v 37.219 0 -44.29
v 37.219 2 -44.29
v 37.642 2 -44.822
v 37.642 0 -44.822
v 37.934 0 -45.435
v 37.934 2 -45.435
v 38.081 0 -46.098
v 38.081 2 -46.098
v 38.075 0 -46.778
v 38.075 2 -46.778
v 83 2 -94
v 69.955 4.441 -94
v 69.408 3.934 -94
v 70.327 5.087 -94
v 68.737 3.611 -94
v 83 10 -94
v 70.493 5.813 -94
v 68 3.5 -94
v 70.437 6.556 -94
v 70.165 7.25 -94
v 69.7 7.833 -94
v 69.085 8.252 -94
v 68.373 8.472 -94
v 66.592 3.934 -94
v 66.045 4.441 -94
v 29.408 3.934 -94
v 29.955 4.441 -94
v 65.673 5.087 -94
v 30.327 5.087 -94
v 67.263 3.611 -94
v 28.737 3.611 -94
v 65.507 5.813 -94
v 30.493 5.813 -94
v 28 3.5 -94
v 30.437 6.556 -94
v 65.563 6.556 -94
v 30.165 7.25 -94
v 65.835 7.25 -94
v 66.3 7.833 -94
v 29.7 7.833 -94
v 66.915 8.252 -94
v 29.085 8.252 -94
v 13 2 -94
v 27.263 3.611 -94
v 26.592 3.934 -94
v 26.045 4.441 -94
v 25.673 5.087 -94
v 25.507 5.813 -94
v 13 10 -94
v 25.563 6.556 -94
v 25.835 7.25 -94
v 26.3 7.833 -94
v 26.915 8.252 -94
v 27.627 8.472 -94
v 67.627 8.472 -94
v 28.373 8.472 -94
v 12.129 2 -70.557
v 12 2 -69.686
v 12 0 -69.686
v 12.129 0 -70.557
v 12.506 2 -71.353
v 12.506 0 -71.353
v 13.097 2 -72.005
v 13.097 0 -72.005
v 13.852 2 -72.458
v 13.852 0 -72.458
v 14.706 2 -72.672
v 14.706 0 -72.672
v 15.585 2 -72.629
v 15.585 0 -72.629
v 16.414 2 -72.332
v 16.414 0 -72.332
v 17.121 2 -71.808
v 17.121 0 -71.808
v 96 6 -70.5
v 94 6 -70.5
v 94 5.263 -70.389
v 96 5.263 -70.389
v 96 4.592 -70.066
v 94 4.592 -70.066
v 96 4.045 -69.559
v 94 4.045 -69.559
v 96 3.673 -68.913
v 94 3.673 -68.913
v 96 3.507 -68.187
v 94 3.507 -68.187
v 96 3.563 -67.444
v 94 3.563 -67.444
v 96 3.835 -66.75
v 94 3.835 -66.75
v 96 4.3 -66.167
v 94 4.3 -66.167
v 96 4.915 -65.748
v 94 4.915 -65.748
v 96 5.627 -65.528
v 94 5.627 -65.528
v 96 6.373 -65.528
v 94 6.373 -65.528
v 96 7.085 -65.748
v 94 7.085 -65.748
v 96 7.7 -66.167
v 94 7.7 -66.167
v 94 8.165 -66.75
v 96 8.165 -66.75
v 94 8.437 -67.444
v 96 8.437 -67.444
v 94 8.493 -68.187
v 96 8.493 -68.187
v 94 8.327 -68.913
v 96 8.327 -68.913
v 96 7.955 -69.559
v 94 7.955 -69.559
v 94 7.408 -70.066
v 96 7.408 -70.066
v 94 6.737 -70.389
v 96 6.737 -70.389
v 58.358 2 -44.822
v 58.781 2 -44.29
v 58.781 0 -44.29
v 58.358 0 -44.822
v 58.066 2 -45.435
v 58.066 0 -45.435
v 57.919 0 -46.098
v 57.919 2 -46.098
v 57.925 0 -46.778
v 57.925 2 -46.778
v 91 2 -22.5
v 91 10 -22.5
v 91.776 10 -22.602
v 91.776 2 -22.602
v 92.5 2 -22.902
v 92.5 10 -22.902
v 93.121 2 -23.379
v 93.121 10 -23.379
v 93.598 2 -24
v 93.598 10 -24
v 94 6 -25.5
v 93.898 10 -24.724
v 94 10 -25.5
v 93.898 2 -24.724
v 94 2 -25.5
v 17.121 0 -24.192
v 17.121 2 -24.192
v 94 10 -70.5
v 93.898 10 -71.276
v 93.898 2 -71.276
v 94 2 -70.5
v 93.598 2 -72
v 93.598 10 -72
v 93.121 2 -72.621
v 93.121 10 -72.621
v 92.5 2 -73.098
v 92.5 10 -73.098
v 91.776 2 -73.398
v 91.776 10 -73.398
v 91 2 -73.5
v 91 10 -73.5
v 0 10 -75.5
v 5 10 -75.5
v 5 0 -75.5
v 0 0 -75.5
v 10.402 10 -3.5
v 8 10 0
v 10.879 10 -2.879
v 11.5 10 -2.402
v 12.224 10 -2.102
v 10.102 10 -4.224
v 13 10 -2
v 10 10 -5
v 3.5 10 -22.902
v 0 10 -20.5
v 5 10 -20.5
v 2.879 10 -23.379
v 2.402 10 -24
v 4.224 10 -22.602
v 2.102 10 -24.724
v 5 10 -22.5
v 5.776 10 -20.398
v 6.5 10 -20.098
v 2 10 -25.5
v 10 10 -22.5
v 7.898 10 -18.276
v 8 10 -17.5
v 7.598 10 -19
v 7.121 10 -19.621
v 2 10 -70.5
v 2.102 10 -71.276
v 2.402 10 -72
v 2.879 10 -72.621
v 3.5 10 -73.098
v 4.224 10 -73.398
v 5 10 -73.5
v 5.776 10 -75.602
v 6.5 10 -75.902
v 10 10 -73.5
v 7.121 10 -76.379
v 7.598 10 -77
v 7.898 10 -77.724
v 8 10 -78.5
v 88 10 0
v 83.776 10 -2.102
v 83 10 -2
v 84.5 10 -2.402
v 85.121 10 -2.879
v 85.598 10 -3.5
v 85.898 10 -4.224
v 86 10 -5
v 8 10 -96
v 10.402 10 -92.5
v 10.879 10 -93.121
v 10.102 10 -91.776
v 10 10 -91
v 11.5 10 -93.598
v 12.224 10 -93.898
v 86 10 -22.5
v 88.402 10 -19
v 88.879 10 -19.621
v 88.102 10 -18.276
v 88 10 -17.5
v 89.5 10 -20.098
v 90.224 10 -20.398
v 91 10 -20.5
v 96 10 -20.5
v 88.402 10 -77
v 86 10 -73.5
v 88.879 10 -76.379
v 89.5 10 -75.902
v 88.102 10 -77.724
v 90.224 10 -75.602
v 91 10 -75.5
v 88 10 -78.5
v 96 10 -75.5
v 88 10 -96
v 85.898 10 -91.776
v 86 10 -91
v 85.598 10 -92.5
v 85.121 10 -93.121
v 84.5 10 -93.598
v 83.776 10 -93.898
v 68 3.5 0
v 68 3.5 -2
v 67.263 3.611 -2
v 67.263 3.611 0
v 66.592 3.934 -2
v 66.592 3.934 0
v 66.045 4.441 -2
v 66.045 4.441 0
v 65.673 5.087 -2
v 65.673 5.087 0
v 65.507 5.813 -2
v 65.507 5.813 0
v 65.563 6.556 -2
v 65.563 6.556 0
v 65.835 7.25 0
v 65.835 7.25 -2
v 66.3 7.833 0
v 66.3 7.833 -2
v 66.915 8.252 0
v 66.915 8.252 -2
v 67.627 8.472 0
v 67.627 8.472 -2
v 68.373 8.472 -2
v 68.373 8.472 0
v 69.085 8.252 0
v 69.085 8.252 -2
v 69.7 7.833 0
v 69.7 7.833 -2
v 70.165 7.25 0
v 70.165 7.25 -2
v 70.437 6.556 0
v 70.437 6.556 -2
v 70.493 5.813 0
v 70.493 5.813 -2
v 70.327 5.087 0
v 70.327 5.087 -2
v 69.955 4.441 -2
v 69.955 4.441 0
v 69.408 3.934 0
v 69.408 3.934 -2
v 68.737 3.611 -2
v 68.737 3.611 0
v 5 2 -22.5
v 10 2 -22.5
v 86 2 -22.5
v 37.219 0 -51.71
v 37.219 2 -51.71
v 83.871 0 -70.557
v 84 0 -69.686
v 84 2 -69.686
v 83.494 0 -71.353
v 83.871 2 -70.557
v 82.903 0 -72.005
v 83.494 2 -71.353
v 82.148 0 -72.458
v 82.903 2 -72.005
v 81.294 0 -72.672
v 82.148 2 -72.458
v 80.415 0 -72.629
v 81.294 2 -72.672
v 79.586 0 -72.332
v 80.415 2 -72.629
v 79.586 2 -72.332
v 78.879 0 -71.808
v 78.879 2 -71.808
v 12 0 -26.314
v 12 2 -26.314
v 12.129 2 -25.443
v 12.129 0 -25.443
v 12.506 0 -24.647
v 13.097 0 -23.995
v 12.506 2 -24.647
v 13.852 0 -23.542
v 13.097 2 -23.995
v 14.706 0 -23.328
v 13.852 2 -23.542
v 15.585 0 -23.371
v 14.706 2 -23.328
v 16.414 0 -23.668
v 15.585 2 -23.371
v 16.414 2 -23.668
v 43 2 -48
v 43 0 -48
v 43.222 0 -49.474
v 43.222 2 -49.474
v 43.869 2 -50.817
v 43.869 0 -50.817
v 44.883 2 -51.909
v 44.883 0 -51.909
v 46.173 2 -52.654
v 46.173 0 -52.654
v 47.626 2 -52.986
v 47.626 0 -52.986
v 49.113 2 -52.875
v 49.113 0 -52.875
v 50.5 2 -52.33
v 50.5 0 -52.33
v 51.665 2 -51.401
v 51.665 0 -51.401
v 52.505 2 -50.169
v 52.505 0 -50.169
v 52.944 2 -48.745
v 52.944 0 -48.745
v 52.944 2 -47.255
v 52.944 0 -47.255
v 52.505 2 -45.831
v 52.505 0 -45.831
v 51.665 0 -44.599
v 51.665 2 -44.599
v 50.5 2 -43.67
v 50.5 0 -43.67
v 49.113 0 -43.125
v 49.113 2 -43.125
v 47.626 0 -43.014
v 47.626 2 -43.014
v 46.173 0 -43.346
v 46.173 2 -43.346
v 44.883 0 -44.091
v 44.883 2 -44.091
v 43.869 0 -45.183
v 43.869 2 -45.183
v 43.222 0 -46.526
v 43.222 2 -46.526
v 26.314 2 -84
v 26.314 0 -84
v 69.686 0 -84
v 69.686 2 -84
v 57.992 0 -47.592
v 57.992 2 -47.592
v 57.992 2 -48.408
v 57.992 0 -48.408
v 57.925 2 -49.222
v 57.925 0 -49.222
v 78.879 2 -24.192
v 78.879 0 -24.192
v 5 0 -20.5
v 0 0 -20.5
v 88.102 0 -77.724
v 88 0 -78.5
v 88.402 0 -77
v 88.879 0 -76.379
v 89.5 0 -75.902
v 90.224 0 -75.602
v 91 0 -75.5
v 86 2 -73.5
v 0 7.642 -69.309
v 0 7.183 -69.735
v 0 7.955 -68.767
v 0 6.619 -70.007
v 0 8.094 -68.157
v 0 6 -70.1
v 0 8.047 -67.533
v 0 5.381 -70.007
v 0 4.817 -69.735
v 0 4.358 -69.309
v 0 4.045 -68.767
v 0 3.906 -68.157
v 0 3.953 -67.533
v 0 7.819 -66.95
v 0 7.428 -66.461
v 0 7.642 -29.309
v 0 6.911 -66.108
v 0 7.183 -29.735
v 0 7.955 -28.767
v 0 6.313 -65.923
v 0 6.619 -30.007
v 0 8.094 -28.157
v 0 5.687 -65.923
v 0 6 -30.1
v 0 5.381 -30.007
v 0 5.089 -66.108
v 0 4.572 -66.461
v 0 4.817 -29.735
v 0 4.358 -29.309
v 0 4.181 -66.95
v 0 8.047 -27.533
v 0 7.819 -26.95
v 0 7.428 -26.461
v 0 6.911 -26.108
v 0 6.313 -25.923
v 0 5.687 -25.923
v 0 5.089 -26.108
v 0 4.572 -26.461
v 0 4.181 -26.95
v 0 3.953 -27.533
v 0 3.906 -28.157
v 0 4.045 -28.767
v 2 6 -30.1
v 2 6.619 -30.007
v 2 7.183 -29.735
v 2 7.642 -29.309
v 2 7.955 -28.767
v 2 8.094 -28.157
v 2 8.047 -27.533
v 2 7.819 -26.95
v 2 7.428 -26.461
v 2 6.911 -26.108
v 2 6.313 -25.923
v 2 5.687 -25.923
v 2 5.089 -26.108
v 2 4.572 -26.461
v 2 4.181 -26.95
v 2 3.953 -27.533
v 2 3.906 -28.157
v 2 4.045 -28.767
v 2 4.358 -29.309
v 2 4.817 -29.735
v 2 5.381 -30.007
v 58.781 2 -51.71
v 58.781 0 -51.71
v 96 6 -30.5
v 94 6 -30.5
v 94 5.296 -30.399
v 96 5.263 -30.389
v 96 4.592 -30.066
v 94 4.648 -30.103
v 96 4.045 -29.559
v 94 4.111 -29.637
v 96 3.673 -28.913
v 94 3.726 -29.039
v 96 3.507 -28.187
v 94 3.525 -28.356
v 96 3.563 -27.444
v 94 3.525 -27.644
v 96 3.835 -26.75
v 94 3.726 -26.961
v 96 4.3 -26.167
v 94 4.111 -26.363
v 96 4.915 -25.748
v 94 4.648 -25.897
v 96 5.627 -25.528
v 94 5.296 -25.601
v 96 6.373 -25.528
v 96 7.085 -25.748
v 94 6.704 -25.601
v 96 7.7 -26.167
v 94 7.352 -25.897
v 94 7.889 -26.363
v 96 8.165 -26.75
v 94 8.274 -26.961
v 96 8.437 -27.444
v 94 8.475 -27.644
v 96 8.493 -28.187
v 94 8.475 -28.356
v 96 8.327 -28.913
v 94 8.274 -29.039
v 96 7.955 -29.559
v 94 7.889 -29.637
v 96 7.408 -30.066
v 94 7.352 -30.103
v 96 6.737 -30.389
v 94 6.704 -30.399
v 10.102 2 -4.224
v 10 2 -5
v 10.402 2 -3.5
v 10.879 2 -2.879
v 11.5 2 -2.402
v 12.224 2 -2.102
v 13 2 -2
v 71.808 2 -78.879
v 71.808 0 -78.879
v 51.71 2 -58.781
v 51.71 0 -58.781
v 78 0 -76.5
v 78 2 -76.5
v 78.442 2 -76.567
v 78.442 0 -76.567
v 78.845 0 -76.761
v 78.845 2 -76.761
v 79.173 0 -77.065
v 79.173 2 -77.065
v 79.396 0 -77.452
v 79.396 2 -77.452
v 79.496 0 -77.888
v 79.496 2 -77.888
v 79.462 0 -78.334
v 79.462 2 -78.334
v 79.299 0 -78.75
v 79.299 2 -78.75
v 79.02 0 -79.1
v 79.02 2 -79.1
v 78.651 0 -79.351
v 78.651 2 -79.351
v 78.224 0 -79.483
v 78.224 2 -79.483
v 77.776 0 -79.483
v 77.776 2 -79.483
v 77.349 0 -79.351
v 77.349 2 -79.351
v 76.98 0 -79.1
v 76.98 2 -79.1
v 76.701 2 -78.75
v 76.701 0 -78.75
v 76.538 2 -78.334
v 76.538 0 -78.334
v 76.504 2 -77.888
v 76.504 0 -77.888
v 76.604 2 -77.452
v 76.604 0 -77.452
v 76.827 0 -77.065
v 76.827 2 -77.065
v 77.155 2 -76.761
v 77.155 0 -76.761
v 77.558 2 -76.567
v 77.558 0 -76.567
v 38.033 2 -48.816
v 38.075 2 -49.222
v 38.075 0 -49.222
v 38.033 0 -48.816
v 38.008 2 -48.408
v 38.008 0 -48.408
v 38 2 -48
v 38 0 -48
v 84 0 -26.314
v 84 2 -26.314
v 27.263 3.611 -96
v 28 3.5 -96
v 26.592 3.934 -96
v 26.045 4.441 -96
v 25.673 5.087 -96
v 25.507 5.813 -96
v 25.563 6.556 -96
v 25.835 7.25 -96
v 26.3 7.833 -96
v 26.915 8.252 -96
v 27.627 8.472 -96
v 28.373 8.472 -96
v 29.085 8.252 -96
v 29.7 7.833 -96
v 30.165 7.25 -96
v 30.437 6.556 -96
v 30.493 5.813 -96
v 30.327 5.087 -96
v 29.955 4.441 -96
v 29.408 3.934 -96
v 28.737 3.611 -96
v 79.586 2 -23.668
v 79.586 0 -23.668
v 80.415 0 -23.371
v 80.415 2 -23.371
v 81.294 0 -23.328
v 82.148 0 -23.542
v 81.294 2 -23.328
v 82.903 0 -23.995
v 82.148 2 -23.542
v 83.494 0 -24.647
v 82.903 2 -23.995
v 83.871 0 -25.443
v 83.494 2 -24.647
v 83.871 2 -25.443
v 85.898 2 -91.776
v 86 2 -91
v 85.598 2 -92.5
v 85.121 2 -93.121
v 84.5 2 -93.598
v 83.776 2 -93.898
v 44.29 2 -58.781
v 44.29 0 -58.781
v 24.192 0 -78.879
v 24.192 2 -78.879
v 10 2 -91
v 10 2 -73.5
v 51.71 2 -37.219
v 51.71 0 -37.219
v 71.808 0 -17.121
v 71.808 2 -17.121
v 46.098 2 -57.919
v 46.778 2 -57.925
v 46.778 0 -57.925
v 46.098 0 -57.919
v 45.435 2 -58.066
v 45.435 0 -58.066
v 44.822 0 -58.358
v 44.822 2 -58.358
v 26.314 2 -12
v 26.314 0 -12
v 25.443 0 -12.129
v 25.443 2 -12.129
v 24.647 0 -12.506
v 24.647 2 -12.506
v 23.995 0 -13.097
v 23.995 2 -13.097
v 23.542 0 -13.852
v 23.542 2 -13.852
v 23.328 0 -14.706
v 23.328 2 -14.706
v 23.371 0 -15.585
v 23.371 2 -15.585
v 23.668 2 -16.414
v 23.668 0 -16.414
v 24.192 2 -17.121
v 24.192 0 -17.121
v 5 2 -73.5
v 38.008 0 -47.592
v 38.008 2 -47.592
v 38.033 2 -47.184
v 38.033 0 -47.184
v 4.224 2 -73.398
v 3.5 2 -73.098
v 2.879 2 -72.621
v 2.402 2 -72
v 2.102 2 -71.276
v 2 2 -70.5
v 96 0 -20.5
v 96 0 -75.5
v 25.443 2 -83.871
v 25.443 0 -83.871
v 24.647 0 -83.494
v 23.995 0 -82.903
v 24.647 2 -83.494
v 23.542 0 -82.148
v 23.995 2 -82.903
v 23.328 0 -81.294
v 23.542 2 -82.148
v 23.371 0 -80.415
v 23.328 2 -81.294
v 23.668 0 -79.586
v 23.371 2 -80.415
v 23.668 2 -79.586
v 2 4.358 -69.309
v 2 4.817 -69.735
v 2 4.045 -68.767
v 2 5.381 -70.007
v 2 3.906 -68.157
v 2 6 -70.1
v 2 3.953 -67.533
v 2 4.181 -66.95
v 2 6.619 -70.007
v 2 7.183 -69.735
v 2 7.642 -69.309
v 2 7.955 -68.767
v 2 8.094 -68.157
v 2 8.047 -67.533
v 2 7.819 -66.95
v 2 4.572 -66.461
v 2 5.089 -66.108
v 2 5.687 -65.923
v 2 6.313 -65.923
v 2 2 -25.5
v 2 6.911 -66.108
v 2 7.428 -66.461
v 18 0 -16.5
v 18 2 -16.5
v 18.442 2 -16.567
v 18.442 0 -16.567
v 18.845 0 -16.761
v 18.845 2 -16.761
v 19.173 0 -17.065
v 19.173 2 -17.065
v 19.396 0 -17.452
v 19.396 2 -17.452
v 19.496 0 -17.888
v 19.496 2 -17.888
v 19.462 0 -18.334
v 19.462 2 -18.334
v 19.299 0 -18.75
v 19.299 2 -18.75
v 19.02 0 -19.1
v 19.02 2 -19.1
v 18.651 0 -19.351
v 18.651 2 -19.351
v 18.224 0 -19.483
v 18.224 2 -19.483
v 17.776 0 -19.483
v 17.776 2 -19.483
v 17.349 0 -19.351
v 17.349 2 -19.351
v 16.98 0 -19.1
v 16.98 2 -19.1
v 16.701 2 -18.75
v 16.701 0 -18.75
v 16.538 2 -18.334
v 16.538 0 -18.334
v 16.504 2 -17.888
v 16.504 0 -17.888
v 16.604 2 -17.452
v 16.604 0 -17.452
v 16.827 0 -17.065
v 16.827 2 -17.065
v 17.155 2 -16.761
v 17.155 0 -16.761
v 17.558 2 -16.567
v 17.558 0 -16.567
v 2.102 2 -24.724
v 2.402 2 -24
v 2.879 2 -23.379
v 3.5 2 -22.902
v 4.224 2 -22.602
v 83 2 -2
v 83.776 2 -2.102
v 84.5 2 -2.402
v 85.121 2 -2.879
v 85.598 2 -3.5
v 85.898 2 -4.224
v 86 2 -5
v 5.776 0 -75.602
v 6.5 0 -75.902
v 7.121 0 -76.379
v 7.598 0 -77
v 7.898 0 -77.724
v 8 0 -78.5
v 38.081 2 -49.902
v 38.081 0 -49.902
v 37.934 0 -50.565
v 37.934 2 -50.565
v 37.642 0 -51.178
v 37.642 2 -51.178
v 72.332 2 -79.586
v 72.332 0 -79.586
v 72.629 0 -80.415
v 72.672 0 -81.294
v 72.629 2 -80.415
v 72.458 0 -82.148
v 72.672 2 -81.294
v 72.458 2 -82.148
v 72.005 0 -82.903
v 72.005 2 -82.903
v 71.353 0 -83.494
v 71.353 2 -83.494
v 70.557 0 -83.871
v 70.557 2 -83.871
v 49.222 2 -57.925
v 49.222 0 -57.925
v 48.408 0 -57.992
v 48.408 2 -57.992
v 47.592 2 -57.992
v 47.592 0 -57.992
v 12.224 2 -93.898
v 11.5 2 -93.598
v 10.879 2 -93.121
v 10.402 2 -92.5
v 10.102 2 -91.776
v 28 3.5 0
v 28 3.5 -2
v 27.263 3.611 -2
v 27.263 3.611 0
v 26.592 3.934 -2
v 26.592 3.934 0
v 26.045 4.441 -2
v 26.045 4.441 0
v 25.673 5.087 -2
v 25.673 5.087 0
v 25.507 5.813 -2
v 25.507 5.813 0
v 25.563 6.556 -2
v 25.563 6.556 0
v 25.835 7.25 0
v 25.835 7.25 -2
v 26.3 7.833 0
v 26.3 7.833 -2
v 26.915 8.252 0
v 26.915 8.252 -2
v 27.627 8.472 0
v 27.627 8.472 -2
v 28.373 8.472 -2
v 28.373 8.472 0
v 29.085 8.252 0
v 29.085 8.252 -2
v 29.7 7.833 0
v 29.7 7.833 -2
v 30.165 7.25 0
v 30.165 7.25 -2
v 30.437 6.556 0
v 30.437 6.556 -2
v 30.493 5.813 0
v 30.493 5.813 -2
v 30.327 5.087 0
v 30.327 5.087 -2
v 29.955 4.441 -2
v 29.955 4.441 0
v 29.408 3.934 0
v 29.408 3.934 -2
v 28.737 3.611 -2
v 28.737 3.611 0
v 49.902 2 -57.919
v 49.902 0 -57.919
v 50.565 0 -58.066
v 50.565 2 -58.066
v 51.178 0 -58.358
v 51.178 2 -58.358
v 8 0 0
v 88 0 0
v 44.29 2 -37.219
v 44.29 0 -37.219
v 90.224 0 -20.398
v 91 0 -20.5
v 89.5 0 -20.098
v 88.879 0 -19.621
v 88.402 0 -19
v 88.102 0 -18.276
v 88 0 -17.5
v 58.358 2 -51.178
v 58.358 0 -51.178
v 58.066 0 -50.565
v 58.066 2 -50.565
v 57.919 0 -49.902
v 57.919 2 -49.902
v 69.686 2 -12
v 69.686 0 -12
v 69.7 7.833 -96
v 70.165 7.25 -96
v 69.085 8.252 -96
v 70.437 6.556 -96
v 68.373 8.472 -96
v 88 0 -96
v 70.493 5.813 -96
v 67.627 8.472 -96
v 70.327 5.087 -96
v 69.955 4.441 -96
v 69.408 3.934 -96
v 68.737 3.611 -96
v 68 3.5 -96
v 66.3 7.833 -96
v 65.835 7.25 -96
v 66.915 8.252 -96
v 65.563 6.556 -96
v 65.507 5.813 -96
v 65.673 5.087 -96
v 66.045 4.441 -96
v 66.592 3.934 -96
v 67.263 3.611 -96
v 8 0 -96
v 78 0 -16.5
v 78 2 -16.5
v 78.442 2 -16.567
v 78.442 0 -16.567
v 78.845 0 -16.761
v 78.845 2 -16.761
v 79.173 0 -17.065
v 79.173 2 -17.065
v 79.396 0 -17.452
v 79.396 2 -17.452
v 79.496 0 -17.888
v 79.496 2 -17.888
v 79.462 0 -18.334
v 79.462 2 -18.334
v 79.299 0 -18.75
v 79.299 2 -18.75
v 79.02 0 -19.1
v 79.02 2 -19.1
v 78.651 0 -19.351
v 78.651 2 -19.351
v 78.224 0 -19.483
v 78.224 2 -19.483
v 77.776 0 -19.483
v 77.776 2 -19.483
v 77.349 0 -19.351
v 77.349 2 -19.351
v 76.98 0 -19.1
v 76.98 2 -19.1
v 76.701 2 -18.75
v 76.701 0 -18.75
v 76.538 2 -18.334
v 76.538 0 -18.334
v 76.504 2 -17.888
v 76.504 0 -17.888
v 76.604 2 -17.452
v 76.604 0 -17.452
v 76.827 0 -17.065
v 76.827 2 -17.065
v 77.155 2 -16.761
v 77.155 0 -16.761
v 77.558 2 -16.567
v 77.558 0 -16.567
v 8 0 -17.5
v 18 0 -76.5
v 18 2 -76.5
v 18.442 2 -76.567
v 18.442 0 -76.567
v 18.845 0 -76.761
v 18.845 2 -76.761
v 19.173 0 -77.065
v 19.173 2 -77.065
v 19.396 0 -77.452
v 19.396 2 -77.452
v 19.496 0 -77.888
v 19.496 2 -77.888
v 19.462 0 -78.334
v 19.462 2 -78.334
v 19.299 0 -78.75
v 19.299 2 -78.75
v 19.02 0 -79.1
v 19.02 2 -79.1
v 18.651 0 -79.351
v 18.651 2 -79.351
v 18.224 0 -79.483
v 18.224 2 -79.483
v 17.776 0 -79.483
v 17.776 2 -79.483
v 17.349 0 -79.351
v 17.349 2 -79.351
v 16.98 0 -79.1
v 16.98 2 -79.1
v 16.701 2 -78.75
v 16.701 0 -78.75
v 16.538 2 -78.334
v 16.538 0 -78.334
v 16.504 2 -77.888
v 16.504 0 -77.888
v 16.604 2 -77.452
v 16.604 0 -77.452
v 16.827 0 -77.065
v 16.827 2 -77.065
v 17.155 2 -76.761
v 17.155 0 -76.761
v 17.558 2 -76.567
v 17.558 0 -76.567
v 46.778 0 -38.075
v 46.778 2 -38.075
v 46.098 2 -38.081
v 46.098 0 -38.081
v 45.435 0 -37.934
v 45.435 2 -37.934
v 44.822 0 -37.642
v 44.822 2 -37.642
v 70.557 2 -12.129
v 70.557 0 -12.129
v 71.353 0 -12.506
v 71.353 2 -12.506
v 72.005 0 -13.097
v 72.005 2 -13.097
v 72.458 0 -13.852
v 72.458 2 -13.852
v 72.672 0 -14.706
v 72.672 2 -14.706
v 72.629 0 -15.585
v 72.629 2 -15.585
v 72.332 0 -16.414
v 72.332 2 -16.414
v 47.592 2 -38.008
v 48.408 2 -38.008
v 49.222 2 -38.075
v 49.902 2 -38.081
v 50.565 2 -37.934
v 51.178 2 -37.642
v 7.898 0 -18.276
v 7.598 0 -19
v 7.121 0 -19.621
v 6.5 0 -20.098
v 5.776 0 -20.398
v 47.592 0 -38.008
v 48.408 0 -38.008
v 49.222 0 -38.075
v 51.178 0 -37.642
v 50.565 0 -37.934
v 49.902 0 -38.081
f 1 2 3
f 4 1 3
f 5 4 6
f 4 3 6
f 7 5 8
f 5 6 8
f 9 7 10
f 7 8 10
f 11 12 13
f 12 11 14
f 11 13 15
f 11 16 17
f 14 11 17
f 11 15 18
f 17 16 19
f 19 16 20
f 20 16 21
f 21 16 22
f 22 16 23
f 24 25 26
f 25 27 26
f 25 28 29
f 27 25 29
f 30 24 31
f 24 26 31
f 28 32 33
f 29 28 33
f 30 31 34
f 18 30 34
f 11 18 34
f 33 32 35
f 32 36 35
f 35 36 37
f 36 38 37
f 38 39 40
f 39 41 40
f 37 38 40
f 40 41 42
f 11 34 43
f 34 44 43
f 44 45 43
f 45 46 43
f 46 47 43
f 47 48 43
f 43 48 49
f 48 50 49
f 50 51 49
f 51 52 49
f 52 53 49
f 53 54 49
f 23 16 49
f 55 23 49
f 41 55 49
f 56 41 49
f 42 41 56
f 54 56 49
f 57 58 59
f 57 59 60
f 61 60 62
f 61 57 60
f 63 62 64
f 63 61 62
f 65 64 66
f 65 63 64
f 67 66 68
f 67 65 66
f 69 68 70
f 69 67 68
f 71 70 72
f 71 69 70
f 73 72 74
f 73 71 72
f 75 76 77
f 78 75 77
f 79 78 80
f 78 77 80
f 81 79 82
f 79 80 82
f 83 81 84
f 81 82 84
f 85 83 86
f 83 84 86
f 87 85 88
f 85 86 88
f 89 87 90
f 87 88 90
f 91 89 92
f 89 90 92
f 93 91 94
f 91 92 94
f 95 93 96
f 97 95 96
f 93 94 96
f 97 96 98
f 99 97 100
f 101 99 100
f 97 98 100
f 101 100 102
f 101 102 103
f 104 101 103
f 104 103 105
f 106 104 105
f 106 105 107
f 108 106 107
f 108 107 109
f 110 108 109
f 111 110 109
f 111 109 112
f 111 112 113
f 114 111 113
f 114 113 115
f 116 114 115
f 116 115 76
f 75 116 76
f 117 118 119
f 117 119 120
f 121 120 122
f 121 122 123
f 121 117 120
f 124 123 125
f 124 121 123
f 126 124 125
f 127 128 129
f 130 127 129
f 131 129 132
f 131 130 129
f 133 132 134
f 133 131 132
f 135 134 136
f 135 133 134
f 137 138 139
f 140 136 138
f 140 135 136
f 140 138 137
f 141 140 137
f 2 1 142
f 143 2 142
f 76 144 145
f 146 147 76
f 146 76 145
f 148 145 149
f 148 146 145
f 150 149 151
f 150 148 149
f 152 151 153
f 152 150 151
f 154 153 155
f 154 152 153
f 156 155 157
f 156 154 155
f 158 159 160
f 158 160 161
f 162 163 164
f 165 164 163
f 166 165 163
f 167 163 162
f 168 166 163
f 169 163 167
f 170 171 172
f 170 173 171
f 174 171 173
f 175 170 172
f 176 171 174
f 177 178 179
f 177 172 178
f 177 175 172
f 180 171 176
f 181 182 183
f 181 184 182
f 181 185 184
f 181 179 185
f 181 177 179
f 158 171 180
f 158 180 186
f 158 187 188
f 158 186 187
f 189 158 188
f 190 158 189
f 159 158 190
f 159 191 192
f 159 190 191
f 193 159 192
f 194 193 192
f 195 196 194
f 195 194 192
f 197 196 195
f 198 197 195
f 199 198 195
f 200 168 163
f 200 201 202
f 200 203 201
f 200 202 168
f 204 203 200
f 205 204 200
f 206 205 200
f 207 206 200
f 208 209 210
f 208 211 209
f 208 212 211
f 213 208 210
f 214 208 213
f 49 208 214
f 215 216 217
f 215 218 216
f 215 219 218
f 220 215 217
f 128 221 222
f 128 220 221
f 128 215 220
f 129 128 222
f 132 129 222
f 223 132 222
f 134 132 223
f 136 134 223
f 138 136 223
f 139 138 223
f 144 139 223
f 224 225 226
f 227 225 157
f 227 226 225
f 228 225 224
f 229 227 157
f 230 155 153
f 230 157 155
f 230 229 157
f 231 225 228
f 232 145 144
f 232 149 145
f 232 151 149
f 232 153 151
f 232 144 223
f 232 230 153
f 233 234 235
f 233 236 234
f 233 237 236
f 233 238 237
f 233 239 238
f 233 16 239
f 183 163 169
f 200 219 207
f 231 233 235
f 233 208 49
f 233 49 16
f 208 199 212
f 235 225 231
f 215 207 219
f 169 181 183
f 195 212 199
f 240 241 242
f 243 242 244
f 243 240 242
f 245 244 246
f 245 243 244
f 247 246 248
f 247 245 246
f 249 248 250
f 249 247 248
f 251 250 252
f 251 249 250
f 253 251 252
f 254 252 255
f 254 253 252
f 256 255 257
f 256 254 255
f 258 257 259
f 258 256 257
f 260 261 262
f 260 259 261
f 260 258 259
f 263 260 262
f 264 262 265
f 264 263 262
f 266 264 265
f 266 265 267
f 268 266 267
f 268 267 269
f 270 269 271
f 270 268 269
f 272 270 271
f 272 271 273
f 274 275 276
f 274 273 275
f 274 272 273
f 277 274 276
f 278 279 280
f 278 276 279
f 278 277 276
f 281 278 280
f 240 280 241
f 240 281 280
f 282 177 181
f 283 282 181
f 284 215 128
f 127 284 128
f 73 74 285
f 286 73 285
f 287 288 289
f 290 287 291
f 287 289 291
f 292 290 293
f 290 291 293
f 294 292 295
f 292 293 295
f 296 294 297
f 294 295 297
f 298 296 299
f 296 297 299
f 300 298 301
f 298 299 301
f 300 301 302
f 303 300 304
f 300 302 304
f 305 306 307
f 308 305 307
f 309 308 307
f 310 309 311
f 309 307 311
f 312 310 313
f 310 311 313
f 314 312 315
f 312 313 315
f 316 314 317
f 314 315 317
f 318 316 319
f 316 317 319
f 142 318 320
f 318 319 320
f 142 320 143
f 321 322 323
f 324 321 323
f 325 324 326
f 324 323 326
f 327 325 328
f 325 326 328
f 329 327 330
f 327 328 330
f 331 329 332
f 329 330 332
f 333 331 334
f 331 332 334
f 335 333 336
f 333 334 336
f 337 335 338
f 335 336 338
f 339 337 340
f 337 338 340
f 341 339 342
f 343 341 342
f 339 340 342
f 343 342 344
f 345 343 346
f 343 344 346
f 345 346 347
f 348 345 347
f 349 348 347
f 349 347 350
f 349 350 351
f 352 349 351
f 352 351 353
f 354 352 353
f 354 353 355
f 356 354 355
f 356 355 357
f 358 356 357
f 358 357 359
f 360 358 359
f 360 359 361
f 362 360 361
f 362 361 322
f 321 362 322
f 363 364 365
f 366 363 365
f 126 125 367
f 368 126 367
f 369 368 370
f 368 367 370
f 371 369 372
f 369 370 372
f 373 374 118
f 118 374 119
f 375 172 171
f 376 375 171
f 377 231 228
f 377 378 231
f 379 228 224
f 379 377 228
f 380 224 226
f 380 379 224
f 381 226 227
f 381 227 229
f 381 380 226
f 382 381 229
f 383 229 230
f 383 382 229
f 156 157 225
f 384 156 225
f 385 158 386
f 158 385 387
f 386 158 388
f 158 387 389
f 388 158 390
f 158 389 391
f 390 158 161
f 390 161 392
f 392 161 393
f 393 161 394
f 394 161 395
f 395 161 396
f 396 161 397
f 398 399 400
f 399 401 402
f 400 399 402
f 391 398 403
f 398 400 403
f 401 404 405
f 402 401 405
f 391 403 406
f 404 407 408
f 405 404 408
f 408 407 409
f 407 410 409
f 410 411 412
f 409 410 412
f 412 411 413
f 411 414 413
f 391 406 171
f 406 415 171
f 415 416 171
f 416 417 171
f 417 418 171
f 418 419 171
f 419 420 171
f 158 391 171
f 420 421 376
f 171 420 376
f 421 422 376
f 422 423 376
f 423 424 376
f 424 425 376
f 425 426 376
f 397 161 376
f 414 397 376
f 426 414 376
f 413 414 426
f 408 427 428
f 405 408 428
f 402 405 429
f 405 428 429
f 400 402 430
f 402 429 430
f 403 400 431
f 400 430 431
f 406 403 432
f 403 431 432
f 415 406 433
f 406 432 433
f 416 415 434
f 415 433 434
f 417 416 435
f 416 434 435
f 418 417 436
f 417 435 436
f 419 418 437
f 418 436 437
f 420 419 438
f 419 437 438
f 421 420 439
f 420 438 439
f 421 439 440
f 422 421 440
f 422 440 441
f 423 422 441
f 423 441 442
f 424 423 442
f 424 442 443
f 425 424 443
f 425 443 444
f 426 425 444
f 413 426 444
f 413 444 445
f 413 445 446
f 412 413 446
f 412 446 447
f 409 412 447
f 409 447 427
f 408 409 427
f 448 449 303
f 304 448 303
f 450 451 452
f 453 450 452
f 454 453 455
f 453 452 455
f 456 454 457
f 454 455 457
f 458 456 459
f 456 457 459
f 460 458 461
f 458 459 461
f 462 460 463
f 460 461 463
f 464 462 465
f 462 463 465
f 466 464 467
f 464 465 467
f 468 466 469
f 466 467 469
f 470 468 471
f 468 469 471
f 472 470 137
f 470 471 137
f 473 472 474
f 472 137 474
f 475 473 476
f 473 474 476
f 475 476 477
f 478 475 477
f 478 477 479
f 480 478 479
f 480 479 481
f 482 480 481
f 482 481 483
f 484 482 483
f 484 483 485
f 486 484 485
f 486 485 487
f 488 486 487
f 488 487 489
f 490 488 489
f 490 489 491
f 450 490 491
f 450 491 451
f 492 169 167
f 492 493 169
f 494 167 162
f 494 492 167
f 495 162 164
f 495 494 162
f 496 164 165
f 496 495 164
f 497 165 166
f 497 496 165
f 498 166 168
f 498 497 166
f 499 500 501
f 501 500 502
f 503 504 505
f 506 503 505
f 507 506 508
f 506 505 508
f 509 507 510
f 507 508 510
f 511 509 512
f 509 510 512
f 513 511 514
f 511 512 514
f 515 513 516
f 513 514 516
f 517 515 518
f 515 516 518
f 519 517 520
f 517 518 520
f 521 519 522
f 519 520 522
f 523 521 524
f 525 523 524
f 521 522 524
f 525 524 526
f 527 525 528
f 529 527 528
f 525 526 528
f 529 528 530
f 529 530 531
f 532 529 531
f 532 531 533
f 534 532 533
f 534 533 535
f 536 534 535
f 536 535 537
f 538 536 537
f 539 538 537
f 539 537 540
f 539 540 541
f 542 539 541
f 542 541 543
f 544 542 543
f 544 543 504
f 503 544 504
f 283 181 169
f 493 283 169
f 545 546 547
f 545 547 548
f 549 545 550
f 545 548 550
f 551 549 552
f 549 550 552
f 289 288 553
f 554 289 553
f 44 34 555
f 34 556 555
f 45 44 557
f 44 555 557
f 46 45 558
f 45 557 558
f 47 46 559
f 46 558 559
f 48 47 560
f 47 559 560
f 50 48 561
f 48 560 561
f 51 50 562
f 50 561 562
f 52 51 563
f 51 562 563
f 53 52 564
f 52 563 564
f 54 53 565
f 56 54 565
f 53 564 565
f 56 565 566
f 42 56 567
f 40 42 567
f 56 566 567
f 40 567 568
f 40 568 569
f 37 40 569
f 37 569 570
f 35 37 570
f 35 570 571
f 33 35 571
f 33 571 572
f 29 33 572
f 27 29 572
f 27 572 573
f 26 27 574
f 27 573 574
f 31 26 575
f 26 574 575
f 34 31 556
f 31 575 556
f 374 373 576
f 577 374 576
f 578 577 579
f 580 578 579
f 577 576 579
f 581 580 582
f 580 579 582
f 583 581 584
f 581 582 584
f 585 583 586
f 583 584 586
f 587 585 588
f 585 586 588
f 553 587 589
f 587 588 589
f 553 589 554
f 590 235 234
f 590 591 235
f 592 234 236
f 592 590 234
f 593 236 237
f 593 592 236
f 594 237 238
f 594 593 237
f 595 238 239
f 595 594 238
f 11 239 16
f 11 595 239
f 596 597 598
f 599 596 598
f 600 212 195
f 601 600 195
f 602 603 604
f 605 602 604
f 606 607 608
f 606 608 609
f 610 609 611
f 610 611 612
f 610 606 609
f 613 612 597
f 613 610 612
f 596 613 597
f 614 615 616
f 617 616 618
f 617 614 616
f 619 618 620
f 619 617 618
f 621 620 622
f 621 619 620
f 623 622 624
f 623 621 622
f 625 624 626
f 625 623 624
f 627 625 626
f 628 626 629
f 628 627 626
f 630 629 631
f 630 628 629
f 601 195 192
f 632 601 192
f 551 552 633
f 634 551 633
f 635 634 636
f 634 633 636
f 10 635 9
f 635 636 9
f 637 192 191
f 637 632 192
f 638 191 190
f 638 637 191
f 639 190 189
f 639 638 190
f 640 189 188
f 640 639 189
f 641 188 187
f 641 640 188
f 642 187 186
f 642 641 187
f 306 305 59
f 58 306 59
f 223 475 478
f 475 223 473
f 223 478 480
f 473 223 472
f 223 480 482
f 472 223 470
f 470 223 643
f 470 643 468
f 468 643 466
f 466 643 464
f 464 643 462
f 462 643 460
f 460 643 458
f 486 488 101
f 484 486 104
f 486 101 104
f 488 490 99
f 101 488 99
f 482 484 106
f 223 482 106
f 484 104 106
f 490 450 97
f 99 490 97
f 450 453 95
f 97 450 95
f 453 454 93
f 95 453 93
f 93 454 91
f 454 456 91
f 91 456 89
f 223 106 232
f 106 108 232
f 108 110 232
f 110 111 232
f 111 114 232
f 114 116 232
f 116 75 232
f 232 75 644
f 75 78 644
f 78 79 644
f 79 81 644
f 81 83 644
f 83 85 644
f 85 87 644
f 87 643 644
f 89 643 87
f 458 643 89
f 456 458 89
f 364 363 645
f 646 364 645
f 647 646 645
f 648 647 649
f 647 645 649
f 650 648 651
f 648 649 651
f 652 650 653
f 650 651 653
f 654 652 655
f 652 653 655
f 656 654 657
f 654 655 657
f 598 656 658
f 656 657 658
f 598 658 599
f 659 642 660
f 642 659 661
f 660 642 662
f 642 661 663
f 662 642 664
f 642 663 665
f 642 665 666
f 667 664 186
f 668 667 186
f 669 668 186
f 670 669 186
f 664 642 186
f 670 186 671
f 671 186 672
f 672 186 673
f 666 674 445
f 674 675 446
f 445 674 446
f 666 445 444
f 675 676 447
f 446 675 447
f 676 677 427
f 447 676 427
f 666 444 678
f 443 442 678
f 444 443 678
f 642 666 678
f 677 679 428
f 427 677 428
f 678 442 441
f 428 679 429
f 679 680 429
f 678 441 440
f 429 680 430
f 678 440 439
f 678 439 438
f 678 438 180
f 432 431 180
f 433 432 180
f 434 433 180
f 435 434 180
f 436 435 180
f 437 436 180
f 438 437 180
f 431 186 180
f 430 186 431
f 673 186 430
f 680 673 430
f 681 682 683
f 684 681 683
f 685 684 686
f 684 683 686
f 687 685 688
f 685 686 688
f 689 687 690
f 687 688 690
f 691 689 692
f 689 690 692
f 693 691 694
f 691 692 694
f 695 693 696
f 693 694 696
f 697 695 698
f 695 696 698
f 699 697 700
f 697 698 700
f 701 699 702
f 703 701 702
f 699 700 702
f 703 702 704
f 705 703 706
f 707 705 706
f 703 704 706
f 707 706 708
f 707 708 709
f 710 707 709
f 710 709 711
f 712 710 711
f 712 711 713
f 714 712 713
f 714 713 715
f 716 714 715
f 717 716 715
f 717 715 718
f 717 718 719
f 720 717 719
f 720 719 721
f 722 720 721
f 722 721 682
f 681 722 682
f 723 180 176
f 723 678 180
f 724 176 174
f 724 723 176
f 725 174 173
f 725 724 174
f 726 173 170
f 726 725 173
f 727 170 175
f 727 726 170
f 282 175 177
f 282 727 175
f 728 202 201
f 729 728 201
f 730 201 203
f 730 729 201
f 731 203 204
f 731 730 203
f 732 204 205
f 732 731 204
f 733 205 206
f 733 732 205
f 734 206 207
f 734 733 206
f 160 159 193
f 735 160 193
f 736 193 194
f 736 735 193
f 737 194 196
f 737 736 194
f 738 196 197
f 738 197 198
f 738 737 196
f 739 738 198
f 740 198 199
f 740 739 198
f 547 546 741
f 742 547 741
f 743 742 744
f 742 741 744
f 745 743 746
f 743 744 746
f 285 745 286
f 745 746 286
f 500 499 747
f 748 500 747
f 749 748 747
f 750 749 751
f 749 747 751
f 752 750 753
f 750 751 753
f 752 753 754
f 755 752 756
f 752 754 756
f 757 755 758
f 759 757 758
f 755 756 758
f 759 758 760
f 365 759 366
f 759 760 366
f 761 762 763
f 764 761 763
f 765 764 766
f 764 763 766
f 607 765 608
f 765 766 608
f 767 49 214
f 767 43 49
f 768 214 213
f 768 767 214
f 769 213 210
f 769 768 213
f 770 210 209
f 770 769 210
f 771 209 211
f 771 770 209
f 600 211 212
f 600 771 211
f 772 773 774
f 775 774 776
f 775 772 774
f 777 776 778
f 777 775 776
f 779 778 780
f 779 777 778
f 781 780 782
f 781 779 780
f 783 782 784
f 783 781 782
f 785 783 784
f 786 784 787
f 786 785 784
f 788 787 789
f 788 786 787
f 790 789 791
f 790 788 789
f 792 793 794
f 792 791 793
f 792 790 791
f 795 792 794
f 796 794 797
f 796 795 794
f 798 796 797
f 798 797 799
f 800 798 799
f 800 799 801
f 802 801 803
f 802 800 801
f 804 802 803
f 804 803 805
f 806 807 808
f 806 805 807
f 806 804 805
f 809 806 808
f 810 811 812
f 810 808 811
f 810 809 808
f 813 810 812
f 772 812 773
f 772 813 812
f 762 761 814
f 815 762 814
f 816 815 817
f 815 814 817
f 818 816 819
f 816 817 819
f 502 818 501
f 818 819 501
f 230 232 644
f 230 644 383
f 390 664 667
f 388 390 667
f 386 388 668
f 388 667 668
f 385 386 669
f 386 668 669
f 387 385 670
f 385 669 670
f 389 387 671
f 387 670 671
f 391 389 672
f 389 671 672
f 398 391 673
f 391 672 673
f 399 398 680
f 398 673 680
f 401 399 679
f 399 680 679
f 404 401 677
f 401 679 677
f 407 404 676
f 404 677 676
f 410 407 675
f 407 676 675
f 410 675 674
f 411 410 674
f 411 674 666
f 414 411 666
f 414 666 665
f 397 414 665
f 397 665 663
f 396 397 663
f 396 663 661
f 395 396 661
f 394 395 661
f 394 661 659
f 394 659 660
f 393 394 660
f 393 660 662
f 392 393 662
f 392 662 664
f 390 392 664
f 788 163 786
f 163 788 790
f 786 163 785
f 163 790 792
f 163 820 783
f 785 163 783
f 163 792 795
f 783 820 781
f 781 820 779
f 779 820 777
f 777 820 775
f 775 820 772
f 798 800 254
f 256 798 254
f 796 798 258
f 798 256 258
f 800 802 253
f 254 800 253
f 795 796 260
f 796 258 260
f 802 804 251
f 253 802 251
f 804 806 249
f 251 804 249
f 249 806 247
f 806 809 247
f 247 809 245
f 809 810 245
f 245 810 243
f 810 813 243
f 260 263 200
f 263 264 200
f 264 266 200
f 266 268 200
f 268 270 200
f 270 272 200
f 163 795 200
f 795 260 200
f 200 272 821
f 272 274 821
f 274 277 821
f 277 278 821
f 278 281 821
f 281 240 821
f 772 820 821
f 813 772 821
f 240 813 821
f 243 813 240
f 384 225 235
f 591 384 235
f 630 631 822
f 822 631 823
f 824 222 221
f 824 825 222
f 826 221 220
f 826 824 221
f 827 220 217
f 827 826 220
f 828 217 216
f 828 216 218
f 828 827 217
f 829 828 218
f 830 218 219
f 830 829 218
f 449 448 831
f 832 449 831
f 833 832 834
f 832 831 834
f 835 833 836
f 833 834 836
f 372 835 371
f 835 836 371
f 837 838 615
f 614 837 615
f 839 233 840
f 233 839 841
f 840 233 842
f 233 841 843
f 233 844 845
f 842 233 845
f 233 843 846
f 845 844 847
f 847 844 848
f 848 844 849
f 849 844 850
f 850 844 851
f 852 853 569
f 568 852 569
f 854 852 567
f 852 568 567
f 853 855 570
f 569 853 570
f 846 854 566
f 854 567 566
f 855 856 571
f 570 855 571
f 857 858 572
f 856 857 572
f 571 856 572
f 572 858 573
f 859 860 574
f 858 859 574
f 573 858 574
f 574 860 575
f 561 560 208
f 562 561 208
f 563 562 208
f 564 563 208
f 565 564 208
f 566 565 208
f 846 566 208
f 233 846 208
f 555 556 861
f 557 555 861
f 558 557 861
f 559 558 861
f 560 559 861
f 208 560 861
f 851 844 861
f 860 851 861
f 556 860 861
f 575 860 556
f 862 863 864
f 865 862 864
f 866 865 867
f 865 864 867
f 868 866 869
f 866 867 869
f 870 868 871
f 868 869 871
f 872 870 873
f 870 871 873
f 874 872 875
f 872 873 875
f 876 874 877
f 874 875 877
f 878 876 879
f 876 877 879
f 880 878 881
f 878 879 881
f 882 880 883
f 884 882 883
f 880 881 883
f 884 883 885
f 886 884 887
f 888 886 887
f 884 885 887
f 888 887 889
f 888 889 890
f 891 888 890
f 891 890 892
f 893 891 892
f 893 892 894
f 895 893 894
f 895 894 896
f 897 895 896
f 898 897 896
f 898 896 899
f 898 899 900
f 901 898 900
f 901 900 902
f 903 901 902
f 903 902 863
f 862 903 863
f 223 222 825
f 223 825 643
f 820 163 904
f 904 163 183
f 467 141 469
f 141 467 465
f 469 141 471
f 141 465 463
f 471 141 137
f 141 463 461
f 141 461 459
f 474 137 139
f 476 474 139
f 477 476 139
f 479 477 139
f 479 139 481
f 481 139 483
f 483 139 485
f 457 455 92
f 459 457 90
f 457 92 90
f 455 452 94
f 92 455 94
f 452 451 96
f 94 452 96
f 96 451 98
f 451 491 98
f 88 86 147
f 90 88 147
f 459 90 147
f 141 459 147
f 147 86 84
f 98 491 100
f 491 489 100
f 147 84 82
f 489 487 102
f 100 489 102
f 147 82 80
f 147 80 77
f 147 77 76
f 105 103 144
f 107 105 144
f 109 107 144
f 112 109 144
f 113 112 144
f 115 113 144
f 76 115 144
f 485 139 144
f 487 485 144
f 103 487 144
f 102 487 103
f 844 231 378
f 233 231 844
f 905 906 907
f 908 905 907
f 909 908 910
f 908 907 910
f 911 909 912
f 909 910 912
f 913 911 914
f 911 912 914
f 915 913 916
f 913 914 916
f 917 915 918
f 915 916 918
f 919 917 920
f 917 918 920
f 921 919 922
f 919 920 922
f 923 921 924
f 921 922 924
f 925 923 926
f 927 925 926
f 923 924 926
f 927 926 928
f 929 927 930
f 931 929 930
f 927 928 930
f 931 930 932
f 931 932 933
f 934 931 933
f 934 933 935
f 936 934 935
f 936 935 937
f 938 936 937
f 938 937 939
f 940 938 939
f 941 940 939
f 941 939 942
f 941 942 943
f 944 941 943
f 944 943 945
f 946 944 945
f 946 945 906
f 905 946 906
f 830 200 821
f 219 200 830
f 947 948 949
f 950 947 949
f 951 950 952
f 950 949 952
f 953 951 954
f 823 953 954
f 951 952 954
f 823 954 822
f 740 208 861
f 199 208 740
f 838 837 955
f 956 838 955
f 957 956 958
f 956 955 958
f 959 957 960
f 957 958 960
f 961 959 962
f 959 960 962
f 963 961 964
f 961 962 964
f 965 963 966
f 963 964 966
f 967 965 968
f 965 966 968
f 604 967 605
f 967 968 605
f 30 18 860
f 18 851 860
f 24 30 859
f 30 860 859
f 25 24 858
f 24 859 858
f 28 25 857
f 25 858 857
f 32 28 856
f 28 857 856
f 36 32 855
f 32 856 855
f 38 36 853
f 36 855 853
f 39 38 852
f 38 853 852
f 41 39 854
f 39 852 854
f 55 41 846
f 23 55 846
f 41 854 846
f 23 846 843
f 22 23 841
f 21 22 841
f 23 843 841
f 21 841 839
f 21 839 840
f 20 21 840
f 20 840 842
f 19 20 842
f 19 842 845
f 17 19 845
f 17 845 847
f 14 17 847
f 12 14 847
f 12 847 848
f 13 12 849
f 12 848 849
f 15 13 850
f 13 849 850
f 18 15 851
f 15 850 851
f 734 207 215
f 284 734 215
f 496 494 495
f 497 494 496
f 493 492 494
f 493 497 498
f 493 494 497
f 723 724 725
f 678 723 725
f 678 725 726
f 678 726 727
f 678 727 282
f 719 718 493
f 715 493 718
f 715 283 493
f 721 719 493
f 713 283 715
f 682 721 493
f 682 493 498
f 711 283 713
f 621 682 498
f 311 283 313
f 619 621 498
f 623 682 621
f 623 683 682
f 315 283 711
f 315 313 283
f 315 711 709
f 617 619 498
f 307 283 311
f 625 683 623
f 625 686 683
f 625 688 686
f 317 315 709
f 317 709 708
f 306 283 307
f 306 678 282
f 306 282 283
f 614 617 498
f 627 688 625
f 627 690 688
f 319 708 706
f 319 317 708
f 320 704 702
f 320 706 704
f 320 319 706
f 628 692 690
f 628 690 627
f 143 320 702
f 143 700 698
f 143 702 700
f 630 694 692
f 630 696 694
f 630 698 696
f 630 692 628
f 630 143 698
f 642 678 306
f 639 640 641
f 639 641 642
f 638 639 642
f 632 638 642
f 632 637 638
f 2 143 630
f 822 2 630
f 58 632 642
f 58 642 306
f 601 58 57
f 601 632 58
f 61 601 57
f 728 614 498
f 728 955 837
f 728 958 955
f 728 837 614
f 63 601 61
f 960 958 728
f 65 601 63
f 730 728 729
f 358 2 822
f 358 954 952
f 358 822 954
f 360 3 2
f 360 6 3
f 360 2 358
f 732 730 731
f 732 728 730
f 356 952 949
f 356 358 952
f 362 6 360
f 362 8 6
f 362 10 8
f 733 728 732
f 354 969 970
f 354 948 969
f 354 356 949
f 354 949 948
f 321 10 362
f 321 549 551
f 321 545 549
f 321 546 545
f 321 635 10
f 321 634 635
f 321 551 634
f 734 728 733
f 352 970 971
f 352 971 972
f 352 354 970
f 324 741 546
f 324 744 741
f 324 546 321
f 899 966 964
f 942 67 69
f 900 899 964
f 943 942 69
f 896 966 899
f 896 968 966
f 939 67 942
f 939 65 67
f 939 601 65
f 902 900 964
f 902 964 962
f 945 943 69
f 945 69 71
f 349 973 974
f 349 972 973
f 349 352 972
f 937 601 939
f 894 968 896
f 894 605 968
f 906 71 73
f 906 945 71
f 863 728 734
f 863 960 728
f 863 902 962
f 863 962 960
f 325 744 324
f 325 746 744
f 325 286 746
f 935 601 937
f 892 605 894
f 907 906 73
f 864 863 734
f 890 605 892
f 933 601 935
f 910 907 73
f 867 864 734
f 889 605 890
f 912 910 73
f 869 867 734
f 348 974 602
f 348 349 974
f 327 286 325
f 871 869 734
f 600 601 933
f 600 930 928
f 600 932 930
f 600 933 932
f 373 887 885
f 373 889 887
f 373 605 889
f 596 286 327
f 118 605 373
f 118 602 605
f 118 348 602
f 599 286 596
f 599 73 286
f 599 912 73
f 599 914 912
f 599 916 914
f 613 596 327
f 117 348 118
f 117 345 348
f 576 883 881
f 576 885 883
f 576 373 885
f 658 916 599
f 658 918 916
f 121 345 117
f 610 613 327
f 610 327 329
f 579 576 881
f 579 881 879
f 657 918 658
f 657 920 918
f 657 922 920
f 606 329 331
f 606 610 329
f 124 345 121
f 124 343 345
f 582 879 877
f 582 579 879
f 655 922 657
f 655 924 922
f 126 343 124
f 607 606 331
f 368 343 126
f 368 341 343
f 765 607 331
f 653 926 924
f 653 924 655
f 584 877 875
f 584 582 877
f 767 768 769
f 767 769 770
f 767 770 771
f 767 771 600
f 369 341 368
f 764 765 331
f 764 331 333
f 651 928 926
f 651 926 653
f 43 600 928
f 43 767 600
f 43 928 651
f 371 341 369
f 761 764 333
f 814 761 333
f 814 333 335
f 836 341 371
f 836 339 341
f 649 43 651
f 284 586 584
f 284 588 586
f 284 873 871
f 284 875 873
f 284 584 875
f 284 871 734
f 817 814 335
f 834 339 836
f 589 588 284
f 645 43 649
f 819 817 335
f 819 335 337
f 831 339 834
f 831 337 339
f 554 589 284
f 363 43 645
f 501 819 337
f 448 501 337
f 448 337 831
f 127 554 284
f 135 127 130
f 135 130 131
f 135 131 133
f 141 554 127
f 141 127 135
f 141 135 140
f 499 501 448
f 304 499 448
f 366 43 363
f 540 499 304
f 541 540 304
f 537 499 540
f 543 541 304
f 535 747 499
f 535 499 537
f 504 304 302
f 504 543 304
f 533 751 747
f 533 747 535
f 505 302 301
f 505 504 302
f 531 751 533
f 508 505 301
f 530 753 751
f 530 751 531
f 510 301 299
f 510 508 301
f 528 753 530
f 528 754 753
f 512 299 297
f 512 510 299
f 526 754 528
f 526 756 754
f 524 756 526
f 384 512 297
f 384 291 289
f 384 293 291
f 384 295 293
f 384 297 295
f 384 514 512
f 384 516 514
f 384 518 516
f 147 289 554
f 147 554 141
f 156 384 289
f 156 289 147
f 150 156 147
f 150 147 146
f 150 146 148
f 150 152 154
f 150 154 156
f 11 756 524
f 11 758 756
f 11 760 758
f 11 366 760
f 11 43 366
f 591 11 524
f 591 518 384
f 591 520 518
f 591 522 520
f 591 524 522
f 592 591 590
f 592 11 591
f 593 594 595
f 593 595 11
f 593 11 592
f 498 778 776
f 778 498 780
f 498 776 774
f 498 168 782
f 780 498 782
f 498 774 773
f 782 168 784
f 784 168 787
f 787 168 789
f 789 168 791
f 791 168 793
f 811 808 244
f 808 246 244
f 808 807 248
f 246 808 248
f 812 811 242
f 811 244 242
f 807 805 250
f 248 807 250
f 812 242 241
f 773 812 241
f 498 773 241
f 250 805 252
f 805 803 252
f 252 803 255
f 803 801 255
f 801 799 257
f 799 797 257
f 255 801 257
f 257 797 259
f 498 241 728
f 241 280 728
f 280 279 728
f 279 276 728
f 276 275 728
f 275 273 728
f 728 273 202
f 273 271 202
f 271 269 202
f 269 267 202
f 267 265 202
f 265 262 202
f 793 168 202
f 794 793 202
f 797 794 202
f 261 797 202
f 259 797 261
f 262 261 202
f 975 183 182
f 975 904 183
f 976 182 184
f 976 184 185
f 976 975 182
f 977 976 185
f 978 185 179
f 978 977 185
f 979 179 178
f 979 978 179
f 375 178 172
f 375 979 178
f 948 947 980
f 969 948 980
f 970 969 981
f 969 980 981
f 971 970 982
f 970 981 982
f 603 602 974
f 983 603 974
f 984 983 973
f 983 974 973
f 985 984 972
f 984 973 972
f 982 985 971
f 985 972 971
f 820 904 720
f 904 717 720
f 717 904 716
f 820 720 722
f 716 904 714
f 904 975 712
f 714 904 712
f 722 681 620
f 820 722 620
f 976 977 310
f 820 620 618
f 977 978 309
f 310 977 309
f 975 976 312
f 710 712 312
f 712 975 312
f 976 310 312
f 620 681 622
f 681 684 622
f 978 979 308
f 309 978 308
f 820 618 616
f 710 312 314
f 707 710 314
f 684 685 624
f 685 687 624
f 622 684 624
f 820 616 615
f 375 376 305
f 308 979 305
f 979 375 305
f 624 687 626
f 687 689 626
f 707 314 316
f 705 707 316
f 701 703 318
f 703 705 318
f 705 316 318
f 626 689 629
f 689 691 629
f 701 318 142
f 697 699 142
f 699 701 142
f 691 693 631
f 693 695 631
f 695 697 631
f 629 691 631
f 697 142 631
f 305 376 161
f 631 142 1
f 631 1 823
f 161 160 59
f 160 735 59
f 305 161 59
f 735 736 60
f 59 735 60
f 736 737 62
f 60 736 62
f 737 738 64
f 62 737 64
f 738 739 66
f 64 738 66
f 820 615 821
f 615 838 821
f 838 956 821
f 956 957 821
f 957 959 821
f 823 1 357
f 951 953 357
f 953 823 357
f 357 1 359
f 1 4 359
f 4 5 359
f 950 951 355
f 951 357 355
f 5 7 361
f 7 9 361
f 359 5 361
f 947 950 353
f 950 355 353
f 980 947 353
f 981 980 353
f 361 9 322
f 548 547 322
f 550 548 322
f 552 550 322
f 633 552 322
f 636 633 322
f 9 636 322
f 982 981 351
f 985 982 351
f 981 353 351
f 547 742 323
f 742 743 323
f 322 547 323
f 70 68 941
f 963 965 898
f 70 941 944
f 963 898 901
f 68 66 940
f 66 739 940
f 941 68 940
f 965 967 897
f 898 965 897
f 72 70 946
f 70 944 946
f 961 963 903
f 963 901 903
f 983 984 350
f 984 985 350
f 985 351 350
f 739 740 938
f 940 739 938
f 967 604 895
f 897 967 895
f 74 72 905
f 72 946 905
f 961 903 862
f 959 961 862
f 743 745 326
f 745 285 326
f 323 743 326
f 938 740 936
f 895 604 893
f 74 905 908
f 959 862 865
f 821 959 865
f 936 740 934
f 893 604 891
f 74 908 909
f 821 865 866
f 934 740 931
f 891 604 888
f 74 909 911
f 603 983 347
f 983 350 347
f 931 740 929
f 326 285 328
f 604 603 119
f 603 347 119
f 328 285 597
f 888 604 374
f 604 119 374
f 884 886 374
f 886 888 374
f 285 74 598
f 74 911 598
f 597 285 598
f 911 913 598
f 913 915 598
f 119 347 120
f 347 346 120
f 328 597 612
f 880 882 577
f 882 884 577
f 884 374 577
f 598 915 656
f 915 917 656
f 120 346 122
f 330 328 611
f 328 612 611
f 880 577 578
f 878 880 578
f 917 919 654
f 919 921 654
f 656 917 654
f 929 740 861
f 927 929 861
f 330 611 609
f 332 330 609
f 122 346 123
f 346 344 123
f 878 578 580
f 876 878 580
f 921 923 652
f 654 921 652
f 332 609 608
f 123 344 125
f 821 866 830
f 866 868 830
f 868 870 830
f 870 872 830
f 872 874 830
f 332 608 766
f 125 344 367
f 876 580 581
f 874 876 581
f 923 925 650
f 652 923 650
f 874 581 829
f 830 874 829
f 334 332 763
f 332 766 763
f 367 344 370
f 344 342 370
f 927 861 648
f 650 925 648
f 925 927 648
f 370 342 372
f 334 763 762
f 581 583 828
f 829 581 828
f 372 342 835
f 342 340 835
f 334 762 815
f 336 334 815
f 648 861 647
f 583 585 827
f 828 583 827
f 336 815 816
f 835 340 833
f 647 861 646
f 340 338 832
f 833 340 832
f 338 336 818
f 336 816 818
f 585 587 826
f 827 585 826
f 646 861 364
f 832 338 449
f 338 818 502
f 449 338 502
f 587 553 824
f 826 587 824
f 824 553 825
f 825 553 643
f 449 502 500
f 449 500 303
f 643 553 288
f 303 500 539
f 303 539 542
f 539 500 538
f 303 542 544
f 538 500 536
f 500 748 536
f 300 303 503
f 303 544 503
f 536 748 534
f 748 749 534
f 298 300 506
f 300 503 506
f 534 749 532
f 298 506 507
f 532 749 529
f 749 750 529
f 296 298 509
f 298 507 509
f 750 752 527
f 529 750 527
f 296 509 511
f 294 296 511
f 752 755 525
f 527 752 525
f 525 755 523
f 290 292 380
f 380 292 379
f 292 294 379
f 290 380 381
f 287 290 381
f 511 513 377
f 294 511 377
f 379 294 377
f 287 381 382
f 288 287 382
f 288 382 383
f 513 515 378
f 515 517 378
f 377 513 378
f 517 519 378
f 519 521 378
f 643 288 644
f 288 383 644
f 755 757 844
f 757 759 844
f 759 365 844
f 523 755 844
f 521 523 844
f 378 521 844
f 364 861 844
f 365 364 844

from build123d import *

# Parameters (mm, degrees)
BOSS_EXTRUDE1_DEPTH             = 10
SKETCH2_R                       = 5
CUT_EXTRUDE1_DEPTH              = 11
FILLET1_R                       = 3
CUT_EXTRUDE4_DEPTH              = 11
CUT_EXTRUDE5_DEPTH              = 8
FILLET2_R                       = 3
F_5_0MM_DOWEL_HOLE2_AT_2_COUNT  = 2
F_5_0MM_DOWEL_HOLE2_AT_2_PITCH  = 40
TAP_DRILL_FOR_M5X0_8_TAP1_D     = 4.2
TAP_DRILL_FOR_M5X0_8_TAP1_DEPTH = 2
F_3_0MM_DOWEL_HOLE3_D           = 3
F_5_0MM_DOWEL_HOLE1_D           = 5
F_5_0MM_DOWEL_HOLE1_DEPTH       = 2


with BuildPart() as part:
    # Sketch1 → Boss-Extrude1 (new body)
    with BuildSketch(Plane(origin=(0, 0, 0), x_dir=(1, 0, 0), z_dir=(0, 1, 0))):
        Polygon((0, 88), (0, 8), (8, 0), (88, 0), (96, 8), (96, 88), (88, 96), (8, 96), align=None)
    extrude(amount=BOSS_EXTRUDE1_DEPTH)

    # Sketch2 → Cut-Extrude1 (cut, through all)
    with BuildSketch(Plane(origin=(0, 0, 0), x_dir=(-1, 0, 0), z_dir=(0, -1, 0))):
        with BuildLine():
            Line((-45.411809549, 57.659258263), (-19.071067812, 84))
            Line((-19.071067812, 84), (-76.928932188, 84))
            Line((-76.928932188, 84), (-50.588190451, 57.659258263))
            ThreePointArc((-50.588190451, 57.659258263), (-48, 58), (-45.411809549, 57.659258263))
        make_face()
        with BuildLine():
            Line((-12, 76.928932188), (-38.340741737, 50.588190451))
            ThreePointArc((-38.340741737, 50.588190451), (-38.085551386, 49.305261922), (-38, 48))
            ThreePointArc((-38, 48), (-38.085551386, 46.694738078), (-38.340741737, 45.411809549))
            Line((-38.340741737, 45.411809549), (-12, 19.071067812))
            Line((-12, 19.071067812), (-12, 76.928932188))
        make_face()
        with BuildLine():
            Line((-19.071067812, 12), (-45.411809549, 38.340741737))
            ThreePointArc((-45.411809549, 38.340741737), (-48, 38), (-50.588190451, 38.340741737))
            Line((-50.588190451, 38.340741737), (-76.928932188, 12))
            Line((-76.928932188, 12), (-19.071067812, 12))
        make_face()
        with BuildLine():
            ThreePointArc((-57.659258263, 45.411809549), (-58, 48), (-57.659258263, 50.588190451))
            Line((-57.659258263, 50.588190451), (-84, 76.928932188))
            Line((-84, 76.928932188), (-84, 19.071067812))
            Line((-84, 19.071067812), (-57.659258263, 45.411809549))
        make_face()
        with Locations((-48, 48)):
            Circle(SKETCH2_R)
    extrude(amount=-CUT_EXTRUDE1_DEPTH, mode=Mode.SUBTRACT)

    # Fillet1
    fillet1_edges = [part.edges().sort_by_distance(p)[0] for p in [
        (50.588190451, 5, -38.340741737),
        (45.411809549, 5, -38.340741737),
        (19.071067812, 5, -12),
        (76.928932188, 5, -12),
        (38.340741737, 5, -45.411809549),
        (38.340741737, 5, -50.588190451),
        (12, 5, -76.928932188),
        (12, 5, -19.071067812),
        (57.659258263, 5, -50.588190451),
        (57.659258263, 5, -45.411809549),
        (84, 5, -19.071067812),
        (84, 5, -76.928932188),
        (45.411809549, 5, -57.659258263),
        (50.588190451, 5, -57.659258263),
        (76.928932188, 5, -84),
        (19.071067812, 5, -84),
    ]]
    fillet(fillet1_edges, radius=FILLET1_R)

    # Sketch5 → Cut-Extrude4 (cut, through all)
    with BuildSketch(Plane(origin=(0, 10, 0), x_dir=(1, 0, 0), z_dir=(0, 1, 0))):
        Polygon((8, 0), (8, 20.5), (0, 20.5), (0, 8), align=None)
        Polygon((96, 8), (88, 0), (88, 20.5), (96, 20.5), align=None)
        Polygon((96, 75.5), (88, 75.5), (88, 96), (96, 88), align=None)
        Polygon((8, 96), (8, 75.5), (0, 75.5), (0, 88), align=None)
    extrude(amount=-CUT_EXTRUDE4_DEPTH, mode=Mode.SUBTRACT)

    # Sketch6 → Cut-Extrude5 (cut)
    with BuildSketch(Plane(origin=(0, 10, 0), x_dir=(1, 0, 0), z_dir=(0, 1, 0))):
        Polygon((86, 73.5), (86, 94), (10, 94), (10, 73.5), (2, 73.5), (2, 22.5), (10, 22.5), (10, 2), (86, 2), (86, 22.5), (94, 22.5), (94, 73.5), align=None)
    extrude(amount=-CUT_EXTRUDE5_DEPTH, mode=Mode.SUBTRACT)

    # Fillet2
    fillet2_edges = [part.edges().sort_by_distance(p)[0] for p in [
        (8, 5, -75.5),
        (88, 5, -75.5),
        (88, 5, -20.5),
        (8, 5, -20.5),
        (94, 6, -73.5),
        (94, 6, -22.5),
        (86, 6, -2),
        (10, 6, -2),
        (2, 6, -22.5),
        (2, 6, -73.5),
        (10, 6, -94),
        (86, 6, -94),
    ]]
    fillet(fillet2_edges, radius=FILLET2_R)

    # Sketch13 → Ø5.0mm Dowel Hole2 (revolve, cut)
    with BuildSketch(Plane(origin=(28, 6, 0), x_dir=(0, -1, 0), z_dir=(1, 0, 0))):
        Polygon((0, 0), (0, 9.002151548), (2.5, 7.5), (2.5, 0), align=None)
    f_5_0mm_dowel_hole2 = revolve(axis=Axis((28, 6, 6.35), (0, 0, -1)), mode=Mode.SUBTRACT)

    # Ø5.0mm Dowel Hole2 at 2: Ø5.0mm Dowel Hole2 ×2
    with Locations(*[(i * F_5_0MM_DOWEL_HOLE2_AT_2_PITCH, 0, 0) for i in range(1, F_5_0MM_DOWEL_HOLE2_AT_2_COUNT)]):
        add(f_5_0mm_dowel_hole2, mode=Mode.SUBTRACT)

    # Tap Drill for M5x0.8 Tap1
    with Locations(Plane.ZY):
        with Locations((-68, 6), (-28, 6)):
            Hole(TAP_DRILL_FOR_M5X0_8_TAP1_D / 2, depth=TAP_DRILL_FOR_M5X0_8_TAP1_DEPTH)

    # Mirror1: Ø5.0mm Dowel Hole2 across plane
    add(f_5_0mm_dowel_hole2.mirror(Plane.XY.offset(-48)), mode=Mode.SUBTRACT)

    # Mirror1 copy 1 sketch → Mirror1 copy 1 (revolve, cut)
    with BuildSketch(Plane(origin=(68, 6, -96), x_dir=(0, -1, 0), z_dir=(1, 0, 0))):
        Polygon((0, 0), (0, -9.002151548), (2.5, -7.5), (2.5, 0), align=None)
    revolve(axis=Axis((68, 6, -102.35), (0, 0, -1)), mode=Mode.SUBTRACT)

    # Ø3.0mm Dowel Hole3 (through all)
    with Locations(Plane(origin=(78, 0, -18), x_dir=(0, 0, -1), z_dir=(0, -1, 0))):
        with Locations((0, 0), (60, 0), (60, -60), (0, -60)):
            Hole(F_3_0MM_DOWEL_HOLE3_D / 2)

    # Ø5.0mm Dowel Hole1
    with Locations(Plane(origin=(96, 6, -68), x_dir=(0, 0, 1), z_dir=(1, 0, 0))):
        with Locations((0, 0), (40, 0)):
            Hole(F_5_0MM_DOWEL_HOLE1_D / 2, depth=F_5_0MM_DOWEL_HOLE1_DEPTH)


solid = part.part
